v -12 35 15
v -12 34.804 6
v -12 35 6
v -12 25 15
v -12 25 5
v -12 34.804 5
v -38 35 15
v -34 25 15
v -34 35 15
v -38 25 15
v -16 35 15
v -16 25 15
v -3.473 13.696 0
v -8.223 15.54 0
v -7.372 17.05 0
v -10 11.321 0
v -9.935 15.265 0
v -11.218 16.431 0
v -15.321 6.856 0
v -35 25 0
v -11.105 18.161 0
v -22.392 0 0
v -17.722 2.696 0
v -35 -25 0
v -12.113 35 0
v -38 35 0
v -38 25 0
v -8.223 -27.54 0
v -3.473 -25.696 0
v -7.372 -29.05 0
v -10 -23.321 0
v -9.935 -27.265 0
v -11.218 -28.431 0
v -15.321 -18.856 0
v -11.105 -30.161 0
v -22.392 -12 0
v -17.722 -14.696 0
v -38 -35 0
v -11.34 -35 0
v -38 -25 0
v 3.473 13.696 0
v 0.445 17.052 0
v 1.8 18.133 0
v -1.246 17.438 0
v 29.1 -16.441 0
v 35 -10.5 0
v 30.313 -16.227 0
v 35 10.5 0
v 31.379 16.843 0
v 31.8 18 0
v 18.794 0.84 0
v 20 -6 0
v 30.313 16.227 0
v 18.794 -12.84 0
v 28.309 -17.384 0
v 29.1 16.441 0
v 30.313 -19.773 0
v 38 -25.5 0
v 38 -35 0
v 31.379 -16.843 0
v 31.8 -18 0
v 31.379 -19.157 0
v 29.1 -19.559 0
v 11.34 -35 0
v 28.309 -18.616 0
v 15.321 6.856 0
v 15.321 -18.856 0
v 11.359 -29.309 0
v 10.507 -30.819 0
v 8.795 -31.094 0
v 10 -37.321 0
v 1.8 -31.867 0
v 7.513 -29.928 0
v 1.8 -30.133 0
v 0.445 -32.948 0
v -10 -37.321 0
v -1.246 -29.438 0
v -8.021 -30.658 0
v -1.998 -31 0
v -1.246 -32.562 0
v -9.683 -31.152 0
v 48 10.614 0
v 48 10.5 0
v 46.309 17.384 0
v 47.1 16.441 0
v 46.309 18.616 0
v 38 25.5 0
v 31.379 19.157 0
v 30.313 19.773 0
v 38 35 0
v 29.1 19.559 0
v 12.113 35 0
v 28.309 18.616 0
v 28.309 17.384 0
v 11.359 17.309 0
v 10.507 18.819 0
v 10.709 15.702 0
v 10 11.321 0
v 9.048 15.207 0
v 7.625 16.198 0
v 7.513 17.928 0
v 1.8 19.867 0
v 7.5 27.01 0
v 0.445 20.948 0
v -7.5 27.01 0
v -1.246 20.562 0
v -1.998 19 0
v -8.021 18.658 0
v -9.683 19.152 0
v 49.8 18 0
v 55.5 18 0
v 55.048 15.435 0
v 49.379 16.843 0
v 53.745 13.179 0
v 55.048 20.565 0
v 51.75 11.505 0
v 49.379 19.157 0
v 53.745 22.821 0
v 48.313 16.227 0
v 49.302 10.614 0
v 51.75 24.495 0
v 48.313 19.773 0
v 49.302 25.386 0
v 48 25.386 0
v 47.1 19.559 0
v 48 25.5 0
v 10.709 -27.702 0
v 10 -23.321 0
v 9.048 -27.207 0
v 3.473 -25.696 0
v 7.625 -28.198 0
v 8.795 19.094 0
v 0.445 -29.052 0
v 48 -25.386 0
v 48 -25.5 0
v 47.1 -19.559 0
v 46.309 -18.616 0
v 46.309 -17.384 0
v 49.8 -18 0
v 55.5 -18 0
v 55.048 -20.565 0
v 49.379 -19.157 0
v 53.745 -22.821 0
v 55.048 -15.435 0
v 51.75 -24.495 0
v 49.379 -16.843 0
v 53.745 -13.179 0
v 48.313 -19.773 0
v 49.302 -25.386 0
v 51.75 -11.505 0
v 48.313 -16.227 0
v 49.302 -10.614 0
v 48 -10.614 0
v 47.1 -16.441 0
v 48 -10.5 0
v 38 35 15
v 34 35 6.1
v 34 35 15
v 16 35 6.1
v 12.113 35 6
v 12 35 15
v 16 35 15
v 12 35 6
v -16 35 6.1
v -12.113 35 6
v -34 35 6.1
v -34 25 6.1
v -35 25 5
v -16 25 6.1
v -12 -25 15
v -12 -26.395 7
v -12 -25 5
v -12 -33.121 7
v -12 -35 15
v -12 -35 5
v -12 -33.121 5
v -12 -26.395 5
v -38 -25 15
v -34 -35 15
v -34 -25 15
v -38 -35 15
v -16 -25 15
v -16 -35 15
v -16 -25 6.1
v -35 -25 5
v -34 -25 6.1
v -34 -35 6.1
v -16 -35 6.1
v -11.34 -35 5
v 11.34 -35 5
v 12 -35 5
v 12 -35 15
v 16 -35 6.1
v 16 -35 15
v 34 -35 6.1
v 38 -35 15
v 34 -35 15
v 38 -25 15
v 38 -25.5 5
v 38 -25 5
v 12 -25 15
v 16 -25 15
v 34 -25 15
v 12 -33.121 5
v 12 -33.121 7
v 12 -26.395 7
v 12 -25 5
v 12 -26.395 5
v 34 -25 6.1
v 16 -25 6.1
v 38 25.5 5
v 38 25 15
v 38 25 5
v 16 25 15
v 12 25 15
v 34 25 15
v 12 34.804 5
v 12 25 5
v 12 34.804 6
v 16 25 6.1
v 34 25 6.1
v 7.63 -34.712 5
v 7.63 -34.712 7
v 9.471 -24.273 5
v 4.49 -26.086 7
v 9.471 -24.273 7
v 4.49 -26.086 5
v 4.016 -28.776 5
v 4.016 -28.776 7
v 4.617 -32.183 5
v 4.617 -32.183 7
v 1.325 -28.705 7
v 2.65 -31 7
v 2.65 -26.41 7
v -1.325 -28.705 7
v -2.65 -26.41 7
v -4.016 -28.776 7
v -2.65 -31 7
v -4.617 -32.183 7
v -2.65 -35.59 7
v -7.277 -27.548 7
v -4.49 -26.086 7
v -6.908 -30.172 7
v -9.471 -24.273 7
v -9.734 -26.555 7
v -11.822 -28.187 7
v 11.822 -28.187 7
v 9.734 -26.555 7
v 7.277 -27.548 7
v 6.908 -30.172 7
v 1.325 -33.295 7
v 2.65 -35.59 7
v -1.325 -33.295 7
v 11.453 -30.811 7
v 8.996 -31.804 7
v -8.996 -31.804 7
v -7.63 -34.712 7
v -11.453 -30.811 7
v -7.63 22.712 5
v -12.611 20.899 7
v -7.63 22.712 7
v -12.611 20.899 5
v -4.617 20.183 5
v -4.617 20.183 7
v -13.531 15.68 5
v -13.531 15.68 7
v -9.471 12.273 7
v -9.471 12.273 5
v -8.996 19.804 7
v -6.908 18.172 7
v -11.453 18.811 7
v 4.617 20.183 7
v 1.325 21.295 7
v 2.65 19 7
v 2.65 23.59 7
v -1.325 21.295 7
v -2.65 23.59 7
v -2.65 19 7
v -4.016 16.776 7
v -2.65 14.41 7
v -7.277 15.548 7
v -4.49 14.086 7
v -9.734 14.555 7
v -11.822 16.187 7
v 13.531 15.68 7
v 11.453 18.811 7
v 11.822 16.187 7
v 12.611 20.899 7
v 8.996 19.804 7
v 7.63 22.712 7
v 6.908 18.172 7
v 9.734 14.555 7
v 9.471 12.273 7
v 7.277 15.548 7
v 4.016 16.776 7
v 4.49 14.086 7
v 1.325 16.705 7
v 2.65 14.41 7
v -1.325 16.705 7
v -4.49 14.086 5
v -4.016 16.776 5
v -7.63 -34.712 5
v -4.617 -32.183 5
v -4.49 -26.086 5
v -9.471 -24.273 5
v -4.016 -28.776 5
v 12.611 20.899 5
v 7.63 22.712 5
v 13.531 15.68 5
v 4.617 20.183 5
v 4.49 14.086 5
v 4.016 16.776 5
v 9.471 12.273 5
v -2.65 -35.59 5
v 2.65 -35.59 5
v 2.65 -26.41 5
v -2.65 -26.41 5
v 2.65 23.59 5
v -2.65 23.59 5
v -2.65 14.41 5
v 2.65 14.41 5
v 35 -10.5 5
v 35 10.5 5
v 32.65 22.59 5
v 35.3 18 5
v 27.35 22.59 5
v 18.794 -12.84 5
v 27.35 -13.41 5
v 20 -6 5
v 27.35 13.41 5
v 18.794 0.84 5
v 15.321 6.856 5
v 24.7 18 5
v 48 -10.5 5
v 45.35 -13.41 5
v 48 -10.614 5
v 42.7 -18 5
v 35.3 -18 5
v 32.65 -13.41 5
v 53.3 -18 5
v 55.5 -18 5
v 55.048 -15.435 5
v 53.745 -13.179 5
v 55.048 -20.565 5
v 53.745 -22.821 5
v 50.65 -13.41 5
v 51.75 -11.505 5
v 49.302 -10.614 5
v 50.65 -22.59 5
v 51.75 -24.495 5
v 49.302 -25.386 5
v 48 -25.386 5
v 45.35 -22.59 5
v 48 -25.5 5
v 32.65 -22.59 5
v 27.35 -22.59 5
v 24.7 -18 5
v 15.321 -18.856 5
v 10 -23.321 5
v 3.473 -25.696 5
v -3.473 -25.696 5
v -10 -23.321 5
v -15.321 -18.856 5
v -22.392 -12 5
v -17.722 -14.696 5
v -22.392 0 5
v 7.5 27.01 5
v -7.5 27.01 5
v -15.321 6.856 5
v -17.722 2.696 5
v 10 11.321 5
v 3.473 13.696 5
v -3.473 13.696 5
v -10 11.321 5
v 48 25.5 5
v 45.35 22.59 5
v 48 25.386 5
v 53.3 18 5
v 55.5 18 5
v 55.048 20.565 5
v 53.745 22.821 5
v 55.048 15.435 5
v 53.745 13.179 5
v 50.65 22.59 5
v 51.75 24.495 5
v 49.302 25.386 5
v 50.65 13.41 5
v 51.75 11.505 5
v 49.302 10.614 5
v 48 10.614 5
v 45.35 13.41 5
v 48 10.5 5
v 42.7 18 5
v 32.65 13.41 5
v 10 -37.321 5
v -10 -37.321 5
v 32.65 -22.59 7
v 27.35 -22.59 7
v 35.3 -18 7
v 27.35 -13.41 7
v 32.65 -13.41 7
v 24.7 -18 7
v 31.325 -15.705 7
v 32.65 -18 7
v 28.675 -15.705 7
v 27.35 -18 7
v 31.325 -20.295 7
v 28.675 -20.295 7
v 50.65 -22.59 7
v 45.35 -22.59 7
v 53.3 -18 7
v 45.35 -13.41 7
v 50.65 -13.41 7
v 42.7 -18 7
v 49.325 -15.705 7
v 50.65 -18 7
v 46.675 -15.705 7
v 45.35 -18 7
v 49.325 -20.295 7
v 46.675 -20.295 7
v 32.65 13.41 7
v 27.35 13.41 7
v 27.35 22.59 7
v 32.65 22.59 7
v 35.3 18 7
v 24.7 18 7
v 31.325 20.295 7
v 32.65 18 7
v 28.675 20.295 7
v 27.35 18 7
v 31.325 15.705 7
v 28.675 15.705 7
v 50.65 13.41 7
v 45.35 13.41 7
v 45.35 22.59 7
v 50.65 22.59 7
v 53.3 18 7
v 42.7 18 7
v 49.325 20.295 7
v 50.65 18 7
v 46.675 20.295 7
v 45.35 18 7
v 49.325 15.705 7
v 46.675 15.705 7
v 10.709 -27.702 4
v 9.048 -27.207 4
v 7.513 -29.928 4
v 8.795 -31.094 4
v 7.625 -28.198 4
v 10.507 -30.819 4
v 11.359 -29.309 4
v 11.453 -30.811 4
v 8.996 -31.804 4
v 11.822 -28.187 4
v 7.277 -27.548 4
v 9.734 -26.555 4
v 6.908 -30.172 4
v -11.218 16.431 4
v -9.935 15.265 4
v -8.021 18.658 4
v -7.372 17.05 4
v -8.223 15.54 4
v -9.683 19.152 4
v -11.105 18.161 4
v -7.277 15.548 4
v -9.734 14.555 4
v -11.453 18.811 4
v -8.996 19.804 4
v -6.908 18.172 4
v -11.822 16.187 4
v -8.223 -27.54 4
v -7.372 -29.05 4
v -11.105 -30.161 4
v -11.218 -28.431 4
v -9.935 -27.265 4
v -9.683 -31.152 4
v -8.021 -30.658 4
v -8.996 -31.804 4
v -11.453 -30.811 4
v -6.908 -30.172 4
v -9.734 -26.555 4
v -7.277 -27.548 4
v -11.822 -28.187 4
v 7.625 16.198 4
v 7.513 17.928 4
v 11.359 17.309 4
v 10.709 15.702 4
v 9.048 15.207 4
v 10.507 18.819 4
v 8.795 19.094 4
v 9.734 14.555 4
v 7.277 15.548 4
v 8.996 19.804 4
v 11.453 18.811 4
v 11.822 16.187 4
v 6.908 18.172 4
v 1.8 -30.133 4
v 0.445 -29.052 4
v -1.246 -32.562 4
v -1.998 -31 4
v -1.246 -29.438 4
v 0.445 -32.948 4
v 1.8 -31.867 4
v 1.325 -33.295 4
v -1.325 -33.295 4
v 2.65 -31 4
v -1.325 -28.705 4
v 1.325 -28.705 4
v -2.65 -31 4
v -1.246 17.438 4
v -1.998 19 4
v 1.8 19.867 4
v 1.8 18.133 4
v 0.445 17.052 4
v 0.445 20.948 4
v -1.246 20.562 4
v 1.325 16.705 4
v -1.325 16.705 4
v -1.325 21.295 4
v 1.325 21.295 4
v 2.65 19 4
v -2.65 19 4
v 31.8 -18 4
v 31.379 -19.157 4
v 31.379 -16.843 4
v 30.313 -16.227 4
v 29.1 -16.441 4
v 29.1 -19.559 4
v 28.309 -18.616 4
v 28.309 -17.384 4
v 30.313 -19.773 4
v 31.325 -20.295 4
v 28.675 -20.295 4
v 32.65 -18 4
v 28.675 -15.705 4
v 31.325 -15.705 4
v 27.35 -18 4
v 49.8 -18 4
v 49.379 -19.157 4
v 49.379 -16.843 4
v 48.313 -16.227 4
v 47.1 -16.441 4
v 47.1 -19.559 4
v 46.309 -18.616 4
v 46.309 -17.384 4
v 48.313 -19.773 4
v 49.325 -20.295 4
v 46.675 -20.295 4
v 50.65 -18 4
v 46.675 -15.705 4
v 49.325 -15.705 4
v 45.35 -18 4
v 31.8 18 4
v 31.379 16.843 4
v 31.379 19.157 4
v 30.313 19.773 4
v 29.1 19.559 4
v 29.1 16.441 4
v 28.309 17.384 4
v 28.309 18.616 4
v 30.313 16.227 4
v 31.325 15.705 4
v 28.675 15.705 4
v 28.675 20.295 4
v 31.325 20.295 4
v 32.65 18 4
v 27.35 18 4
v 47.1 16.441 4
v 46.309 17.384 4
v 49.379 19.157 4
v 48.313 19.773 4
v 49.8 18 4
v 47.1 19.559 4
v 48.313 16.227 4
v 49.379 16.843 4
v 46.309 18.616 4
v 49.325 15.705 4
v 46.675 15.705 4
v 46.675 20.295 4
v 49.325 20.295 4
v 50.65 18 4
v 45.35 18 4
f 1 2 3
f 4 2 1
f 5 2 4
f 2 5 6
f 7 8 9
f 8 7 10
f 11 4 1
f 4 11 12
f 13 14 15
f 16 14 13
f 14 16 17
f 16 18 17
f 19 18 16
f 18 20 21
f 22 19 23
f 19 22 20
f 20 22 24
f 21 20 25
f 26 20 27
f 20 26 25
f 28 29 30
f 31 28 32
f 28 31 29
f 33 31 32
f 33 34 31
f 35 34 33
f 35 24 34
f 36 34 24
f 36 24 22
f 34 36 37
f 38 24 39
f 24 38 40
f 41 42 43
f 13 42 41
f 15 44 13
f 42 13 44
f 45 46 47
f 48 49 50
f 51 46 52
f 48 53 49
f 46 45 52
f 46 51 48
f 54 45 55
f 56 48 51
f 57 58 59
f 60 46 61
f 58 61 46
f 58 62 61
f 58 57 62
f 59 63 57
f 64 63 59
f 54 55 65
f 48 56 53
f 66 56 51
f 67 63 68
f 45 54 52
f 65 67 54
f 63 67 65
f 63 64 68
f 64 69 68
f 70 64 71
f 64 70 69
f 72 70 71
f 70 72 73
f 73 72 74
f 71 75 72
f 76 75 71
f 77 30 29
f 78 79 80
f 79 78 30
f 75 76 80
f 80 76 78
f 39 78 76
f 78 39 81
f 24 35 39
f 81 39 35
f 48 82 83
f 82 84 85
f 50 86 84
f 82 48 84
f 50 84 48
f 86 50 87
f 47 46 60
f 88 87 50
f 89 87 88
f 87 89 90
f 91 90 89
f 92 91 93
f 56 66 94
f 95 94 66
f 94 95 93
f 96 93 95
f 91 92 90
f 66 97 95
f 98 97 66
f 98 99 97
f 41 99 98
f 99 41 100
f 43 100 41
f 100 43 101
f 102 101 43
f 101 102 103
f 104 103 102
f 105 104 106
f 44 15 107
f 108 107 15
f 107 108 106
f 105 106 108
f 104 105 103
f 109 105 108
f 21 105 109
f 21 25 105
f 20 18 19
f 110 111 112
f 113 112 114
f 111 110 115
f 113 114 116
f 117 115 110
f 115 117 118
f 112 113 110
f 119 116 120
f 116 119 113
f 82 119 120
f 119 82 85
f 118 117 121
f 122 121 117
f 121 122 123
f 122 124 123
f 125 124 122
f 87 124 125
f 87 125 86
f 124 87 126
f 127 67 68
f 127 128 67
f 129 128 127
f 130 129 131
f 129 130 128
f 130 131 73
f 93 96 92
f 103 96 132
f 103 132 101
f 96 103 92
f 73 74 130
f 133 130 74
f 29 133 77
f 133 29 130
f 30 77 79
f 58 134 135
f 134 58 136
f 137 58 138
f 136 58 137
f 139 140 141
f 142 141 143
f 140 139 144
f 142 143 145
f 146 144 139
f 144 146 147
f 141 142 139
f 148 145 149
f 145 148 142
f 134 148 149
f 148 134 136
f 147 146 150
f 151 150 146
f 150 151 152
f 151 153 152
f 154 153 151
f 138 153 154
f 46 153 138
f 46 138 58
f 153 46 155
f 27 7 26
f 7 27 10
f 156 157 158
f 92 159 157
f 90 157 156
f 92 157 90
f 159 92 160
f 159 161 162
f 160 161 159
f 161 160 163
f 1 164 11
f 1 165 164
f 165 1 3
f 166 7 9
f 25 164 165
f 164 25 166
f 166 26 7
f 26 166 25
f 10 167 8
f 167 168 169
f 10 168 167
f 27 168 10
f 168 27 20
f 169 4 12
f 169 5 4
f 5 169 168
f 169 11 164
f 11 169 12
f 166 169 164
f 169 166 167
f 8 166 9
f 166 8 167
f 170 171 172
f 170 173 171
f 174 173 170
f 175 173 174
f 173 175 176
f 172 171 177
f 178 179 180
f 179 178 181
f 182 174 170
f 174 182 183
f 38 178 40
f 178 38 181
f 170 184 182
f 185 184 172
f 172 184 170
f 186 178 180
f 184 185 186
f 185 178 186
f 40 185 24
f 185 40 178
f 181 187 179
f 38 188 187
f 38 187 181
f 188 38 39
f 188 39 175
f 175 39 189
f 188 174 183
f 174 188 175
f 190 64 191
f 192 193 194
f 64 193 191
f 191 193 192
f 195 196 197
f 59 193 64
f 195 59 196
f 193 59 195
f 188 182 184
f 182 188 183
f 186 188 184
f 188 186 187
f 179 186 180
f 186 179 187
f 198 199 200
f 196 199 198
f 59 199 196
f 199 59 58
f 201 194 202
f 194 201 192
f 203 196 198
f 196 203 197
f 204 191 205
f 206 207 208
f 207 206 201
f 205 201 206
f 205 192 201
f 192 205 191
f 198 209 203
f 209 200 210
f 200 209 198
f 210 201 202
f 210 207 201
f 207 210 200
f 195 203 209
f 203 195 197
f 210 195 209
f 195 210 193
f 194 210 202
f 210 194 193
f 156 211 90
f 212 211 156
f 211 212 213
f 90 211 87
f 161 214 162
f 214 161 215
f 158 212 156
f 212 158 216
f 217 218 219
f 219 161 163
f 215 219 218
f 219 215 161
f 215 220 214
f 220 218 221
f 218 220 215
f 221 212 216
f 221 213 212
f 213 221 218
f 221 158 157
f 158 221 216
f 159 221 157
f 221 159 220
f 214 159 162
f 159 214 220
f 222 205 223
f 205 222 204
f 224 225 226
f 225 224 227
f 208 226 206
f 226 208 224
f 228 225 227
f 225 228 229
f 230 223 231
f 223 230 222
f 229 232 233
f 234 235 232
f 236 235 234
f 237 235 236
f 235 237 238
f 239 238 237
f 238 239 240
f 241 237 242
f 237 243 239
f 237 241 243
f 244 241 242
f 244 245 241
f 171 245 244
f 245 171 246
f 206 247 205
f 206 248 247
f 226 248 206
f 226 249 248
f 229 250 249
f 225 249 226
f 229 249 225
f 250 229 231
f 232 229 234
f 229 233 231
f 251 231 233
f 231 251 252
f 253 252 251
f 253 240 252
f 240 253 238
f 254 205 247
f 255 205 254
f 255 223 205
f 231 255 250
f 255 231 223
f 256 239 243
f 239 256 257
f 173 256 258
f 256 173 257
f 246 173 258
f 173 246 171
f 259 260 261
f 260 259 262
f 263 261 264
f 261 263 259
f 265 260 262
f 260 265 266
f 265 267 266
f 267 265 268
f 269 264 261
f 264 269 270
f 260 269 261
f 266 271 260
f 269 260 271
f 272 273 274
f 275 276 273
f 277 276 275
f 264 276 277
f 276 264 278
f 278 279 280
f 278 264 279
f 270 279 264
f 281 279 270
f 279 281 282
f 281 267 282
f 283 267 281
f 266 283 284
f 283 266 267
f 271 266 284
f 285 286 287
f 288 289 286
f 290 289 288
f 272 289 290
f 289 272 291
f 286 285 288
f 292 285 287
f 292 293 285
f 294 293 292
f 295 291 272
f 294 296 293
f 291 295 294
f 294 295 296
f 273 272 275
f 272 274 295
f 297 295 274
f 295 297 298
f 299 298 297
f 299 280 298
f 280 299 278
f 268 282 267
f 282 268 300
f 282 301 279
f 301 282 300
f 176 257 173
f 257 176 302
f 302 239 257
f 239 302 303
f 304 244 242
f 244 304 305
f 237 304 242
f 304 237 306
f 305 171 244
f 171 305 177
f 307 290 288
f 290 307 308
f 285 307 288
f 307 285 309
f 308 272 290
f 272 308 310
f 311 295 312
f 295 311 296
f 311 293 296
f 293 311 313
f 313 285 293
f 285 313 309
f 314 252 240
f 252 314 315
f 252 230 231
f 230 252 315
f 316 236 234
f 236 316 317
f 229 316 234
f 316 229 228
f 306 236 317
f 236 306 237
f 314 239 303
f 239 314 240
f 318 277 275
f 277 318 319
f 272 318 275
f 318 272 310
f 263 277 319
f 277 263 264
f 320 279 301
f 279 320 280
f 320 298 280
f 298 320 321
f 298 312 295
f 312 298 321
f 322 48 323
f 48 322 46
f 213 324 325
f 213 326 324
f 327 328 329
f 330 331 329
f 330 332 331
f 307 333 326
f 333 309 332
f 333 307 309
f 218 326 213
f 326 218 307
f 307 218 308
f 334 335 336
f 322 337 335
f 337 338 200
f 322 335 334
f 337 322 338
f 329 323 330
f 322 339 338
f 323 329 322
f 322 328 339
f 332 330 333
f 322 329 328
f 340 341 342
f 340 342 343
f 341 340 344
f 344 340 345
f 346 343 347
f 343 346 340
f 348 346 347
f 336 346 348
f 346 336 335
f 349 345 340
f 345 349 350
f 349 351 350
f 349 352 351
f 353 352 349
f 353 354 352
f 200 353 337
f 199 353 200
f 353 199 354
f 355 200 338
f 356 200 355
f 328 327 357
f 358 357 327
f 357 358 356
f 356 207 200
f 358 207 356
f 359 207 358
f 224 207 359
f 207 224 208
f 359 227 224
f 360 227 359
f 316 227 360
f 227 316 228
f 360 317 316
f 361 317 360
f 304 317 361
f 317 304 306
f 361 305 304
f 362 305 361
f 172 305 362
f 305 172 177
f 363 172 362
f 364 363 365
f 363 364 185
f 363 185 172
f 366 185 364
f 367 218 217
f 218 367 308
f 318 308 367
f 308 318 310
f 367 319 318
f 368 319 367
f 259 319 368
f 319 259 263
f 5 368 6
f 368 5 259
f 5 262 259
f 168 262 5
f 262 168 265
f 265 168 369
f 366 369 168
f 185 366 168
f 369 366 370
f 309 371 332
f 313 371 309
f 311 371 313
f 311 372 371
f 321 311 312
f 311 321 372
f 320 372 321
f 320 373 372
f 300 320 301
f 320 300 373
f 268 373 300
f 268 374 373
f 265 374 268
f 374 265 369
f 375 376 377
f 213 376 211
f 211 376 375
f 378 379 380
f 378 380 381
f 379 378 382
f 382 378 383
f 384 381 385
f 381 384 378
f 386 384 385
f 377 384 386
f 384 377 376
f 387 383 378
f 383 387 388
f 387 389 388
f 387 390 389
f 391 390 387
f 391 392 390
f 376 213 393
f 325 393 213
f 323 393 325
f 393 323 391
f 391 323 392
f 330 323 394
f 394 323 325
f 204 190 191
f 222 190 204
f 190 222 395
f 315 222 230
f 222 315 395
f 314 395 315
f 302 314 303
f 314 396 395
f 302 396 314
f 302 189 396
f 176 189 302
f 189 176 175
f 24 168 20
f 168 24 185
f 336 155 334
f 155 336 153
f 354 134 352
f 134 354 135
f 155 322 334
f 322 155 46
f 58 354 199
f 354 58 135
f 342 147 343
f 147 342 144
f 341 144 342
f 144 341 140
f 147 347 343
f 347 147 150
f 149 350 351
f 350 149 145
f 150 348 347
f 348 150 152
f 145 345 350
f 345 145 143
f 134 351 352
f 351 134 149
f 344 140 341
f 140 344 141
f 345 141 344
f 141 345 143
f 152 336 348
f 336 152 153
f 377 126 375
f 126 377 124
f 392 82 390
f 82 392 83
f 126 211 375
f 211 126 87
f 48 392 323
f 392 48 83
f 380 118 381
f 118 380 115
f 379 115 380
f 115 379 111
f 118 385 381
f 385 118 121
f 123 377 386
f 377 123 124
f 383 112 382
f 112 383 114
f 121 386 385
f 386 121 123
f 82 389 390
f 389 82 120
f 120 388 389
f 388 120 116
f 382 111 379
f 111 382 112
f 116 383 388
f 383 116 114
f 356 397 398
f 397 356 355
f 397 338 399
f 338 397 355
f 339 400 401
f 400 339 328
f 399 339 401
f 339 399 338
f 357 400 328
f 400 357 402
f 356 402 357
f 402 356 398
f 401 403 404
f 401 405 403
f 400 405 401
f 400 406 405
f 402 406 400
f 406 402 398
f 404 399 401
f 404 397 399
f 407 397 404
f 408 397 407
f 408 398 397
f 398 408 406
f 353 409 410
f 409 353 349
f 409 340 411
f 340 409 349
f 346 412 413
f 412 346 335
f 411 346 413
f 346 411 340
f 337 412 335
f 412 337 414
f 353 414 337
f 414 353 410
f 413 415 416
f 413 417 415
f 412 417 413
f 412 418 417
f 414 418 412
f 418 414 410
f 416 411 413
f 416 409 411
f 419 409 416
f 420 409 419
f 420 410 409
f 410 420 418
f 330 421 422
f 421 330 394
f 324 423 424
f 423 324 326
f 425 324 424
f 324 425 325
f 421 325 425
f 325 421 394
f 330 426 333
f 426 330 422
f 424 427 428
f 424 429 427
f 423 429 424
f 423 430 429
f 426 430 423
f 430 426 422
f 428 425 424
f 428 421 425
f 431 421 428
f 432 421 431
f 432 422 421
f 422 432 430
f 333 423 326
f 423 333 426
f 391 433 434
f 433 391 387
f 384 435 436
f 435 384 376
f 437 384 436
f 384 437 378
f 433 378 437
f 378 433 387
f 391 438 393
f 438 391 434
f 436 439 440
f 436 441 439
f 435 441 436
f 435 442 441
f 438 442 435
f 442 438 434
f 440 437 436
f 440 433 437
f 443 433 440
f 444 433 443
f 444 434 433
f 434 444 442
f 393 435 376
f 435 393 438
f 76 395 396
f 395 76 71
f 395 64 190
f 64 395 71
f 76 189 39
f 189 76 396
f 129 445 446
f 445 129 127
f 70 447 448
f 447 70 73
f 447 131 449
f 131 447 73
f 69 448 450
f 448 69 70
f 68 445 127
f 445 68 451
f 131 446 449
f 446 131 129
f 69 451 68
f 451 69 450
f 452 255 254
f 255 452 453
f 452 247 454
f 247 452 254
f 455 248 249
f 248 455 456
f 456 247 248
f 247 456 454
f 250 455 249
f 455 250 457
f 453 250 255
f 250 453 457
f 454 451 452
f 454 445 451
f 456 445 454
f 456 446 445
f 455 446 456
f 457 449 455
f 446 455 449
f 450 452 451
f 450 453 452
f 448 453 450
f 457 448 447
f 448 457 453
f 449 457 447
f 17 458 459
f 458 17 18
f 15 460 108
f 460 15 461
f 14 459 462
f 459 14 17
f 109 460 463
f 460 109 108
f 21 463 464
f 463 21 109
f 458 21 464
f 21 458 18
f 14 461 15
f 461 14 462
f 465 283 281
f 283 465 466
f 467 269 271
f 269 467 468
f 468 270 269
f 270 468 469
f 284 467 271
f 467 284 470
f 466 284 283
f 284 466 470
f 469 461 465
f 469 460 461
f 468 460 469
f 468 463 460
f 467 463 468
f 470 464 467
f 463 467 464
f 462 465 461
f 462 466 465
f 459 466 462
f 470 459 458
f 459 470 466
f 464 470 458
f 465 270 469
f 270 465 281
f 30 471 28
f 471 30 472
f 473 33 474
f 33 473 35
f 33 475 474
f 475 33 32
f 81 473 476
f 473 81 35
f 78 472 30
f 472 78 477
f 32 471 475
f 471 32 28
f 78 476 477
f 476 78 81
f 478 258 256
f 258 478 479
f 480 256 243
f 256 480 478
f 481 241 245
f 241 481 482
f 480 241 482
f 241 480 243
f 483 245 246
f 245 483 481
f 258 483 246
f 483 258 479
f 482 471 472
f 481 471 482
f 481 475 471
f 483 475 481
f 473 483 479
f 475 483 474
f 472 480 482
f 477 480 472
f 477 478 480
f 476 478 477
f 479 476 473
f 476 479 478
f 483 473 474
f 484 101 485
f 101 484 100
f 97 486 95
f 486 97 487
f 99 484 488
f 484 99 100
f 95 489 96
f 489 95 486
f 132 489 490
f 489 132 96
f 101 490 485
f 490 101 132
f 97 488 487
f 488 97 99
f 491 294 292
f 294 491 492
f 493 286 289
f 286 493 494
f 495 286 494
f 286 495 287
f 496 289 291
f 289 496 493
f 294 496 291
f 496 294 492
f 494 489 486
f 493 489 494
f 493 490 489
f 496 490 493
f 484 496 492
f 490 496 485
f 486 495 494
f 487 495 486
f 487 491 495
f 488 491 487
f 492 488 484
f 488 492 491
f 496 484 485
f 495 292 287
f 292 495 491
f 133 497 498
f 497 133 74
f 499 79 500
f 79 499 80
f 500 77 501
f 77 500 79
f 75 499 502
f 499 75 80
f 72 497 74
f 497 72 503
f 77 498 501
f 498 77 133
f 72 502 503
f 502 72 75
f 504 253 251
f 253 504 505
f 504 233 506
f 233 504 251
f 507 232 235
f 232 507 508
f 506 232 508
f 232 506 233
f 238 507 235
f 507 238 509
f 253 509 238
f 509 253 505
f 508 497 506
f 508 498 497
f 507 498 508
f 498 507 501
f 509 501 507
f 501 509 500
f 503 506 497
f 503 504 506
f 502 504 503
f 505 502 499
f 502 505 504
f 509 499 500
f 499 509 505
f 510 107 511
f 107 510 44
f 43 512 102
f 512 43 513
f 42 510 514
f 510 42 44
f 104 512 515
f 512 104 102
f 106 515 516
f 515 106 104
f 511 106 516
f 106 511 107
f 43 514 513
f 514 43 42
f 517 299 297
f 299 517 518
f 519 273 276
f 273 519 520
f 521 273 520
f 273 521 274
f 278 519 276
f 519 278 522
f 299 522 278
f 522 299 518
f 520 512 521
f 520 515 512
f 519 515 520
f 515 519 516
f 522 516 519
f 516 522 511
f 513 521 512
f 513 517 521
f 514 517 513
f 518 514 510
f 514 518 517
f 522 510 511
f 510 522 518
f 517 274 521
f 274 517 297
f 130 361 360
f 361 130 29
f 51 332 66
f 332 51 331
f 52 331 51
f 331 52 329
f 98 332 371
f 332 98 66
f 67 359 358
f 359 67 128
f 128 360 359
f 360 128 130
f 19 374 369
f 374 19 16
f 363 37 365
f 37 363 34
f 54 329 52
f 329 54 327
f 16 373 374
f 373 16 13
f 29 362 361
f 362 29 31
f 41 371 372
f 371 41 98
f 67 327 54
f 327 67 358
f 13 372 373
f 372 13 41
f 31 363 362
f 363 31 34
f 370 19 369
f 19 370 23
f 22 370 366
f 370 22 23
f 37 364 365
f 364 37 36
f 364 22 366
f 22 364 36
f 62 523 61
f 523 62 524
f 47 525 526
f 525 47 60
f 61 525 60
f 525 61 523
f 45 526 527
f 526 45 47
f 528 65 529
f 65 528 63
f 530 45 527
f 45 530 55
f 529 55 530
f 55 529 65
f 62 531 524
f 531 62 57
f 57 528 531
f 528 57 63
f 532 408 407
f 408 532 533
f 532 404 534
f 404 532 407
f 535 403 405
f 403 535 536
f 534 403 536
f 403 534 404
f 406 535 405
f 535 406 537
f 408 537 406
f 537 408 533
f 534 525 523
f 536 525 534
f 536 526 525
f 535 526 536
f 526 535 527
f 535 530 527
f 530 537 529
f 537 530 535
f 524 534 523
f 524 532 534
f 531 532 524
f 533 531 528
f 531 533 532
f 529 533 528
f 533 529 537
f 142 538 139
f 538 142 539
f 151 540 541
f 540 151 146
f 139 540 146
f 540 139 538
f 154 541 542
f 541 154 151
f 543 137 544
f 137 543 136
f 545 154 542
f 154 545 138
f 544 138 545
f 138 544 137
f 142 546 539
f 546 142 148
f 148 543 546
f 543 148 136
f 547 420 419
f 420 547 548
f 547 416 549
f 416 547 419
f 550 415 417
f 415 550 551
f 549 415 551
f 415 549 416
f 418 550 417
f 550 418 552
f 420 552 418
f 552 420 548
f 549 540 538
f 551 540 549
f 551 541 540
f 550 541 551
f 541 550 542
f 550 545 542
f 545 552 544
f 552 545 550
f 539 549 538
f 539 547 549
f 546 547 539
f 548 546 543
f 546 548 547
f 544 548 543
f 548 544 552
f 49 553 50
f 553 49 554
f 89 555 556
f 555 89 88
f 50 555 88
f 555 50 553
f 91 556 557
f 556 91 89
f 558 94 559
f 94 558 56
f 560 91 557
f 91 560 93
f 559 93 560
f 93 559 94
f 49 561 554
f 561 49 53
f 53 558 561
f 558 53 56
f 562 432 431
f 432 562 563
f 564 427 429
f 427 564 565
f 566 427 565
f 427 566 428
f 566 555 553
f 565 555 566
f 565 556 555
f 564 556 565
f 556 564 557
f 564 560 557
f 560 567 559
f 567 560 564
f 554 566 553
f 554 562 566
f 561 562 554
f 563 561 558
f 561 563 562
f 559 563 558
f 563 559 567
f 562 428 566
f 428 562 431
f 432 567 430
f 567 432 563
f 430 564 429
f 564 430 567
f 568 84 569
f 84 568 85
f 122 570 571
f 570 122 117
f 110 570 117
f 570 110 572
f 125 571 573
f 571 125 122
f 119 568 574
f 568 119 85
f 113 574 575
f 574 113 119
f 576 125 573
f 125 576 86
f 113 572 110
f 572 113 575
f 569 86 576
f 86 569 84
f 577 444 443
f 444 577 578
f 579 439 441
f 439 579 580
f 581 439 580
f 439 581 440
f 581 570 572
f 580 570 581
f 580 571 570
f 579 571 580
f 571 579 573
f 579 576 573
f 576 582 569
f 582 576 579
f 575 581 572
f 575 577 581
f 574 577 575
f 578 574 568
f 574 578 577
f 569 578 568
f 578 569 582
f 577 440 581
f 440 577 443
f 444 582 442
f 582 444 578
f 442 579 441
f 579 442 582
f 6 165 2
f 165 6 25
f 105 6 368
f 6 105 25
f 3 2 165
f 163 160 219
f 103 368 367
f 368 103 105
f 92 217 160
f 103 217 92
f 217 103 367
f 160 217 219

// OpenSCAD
// Bushing types
bushing_type = 1; // old style

m3_diameter = 3.6;
m3_nut_diameter = 5.3;
m4_nut_diameter = 4.5; 

// Extruder position
E_pos = [0, -6, 0];

// Based on nophead research
module polyhole(d,h) {
    n = max(round(2 * d),3);
    rotate([0,0,180])
        cylinder(h = h, r = (d / 2) / cos (180 / n), $fn = n);
}

module mountingholes(){
	translate(v = [0, -25, -1]) polyhole(m3_diameter,10);
	translate(v = [0, -25, 4]) cylinder(h = 10, r=m3_nut_diameter/2, $fn=6, center=false);
	//translate(v = [0, -25, 5]) cylinder(h = 9, r=m4_nut_diameter/2, $fn=6, center=true);		
	translate(v = [0, 25, -1]) polyhole(m3_diameter,10);
	translate(v = [0, 25, 4]) cylinder(h = 10, r=m3_nut_diameter/2, $fn=6, center=false);
	//translate(v = [0, 25, 5]) cylinder(h = 9, r=4.5, $fn=6, center=true);
}

module mountingholes_extra(){
	translate(v = [0, -25, 0]) cylinder(h = 7, r=m3_nut_diameter, $fn=6, center=false);
	translate(v = [0, 25, 0]) cylinder(h = 7, r=m3_nut_diameter, $fn=6, center=false);
}

module old_style_bushing() {
	difference() {
		translate(v = [0,0,7.5])cube(size = [26,10,15], center = true);
		translate(v = [0,0,10.6])cube(size = [18,11,9], center = true);
	}
}

module xcarriage() {

difference(){
	union(){
		//Base block
		translate(v = [0,0,2.5])cube(size = [70,70,5], center = true);

		//Bushing
		translate(v = [-25, 30, 0])old_style_bushing();
		translate(v = [-25, -30, 0])old_style_bushing();
		translate(v = [25, -30, 0])old_style_bushing();
		translate(v = [25, 30, 0])old_style_bushing();

		//Belt clamp arms
		translate(v = [33-(7.5/2), -18, 2.5]) cube(size = [45-7.5,15,5], center = true);
		translate(v = [33+45/2-7.5, -18, 2.5]) cylinder(h = 5, r=7.5, $fn=18, center=true);
		translate(v = [33-(7.5/2), 18, 2.5]) cube(size = [45-7.5,15,5], center = true);
		translate(v = [33+45/2-7.5, 18, 2.5]) cylinder(h = 5, r=7.5, $fn=18, center=true);

		//Belt clamp holes extrusion hex
		translate(v = [30, -18, 3.5]) cylinder(h = 7, r=m3_nut_diameter, $fn=6, center=true);
		translate(v = [48, -18, 3.5]) cylinder(h = 7, r=m3_nut_diameter, $fn=6, center=true);
		translate(v = [30, 18, 3.5]) cylinder(h = 7, r=m3_nut_diameter, $fn=6, center=true);
		translate(v = [48, 18, 3.5]) cylinder(h = 7, r=m3_nut_diameter, $fn=6, center=true);

		//Extra material for mounting holes  //TODO, theese elements should be hull()'ed in each end
		translate(v = E_pos){
			rotate(a=[0,0,20]) mountingholes_extra();
			rotate(a=[0,0,-20]) mountingholes_extra();
			rotate(a=[0,0,0]) mountingholes_extra();
		}

		//Niceties
		translate(v = [0, -20, 0]) cylinder(h = 5, r=20, $fn=6, center=false);
	}
	union(){
		//Hotend hole and mounting holes
		translate(v = E_pos){
			//Hotend hole
			cylinder(h = 20, r=20, $fn=18, center=true);
			translate(v = [-12, 0, -1]) rotate(a=[0,0,30]) cylinder(h = 7, r=12, $fn=6, center=false);
			//Extruder mounting holes
			rotate(a=[0,0,22]) mountingholes();
			rotate(a=[0,0,-22]) mountingholes();
			rotate(a=[0,0,0]) mountingholes();
		}

		//Belt clamp holes intrusion hex and hole
		translate(v = [30, -18, 2]) cylinder(h = 10, r=m3_diameter/2, $fn=9, center=true);
		translate(v = [30, -18, 9]) cylinder(h = 10, r=m3_nut_diameter/2, $fn=6, center=true);
		translate(v = [48, -18, 2]) cylinder(h = 10, r=m3_diameter/2, $fn=9, center=true);
		translate(v = [48, -18, 9]) cylinder(h = 10, r=m3_nut_diameter/2, $fn=6, center=true);
		translate(v = [30, 18, 2]) cylinder(h = 10, r=m3_diameter/2, $fn=9, center=true);
		translate(v = [30, 18, 9]) cylinder(h = 10, r=m3_nut_diameter/2, $fn=6, center=true);
		translate(v = [48, 18, 2]) cylinder(h = 10, r=m3_diameter/2, $fn=9, center=true);
		translate(v = [48, 18, 9]) cylinder(h = 10, r=m3_nut_diameter/2, $fn=6, center=true);
	
		//Niceties
		translate(v = [0, 40, -1]) cylinder(h = 7, r=15, $fn=6, center=false);
		}
	}
}

xcarriage();
